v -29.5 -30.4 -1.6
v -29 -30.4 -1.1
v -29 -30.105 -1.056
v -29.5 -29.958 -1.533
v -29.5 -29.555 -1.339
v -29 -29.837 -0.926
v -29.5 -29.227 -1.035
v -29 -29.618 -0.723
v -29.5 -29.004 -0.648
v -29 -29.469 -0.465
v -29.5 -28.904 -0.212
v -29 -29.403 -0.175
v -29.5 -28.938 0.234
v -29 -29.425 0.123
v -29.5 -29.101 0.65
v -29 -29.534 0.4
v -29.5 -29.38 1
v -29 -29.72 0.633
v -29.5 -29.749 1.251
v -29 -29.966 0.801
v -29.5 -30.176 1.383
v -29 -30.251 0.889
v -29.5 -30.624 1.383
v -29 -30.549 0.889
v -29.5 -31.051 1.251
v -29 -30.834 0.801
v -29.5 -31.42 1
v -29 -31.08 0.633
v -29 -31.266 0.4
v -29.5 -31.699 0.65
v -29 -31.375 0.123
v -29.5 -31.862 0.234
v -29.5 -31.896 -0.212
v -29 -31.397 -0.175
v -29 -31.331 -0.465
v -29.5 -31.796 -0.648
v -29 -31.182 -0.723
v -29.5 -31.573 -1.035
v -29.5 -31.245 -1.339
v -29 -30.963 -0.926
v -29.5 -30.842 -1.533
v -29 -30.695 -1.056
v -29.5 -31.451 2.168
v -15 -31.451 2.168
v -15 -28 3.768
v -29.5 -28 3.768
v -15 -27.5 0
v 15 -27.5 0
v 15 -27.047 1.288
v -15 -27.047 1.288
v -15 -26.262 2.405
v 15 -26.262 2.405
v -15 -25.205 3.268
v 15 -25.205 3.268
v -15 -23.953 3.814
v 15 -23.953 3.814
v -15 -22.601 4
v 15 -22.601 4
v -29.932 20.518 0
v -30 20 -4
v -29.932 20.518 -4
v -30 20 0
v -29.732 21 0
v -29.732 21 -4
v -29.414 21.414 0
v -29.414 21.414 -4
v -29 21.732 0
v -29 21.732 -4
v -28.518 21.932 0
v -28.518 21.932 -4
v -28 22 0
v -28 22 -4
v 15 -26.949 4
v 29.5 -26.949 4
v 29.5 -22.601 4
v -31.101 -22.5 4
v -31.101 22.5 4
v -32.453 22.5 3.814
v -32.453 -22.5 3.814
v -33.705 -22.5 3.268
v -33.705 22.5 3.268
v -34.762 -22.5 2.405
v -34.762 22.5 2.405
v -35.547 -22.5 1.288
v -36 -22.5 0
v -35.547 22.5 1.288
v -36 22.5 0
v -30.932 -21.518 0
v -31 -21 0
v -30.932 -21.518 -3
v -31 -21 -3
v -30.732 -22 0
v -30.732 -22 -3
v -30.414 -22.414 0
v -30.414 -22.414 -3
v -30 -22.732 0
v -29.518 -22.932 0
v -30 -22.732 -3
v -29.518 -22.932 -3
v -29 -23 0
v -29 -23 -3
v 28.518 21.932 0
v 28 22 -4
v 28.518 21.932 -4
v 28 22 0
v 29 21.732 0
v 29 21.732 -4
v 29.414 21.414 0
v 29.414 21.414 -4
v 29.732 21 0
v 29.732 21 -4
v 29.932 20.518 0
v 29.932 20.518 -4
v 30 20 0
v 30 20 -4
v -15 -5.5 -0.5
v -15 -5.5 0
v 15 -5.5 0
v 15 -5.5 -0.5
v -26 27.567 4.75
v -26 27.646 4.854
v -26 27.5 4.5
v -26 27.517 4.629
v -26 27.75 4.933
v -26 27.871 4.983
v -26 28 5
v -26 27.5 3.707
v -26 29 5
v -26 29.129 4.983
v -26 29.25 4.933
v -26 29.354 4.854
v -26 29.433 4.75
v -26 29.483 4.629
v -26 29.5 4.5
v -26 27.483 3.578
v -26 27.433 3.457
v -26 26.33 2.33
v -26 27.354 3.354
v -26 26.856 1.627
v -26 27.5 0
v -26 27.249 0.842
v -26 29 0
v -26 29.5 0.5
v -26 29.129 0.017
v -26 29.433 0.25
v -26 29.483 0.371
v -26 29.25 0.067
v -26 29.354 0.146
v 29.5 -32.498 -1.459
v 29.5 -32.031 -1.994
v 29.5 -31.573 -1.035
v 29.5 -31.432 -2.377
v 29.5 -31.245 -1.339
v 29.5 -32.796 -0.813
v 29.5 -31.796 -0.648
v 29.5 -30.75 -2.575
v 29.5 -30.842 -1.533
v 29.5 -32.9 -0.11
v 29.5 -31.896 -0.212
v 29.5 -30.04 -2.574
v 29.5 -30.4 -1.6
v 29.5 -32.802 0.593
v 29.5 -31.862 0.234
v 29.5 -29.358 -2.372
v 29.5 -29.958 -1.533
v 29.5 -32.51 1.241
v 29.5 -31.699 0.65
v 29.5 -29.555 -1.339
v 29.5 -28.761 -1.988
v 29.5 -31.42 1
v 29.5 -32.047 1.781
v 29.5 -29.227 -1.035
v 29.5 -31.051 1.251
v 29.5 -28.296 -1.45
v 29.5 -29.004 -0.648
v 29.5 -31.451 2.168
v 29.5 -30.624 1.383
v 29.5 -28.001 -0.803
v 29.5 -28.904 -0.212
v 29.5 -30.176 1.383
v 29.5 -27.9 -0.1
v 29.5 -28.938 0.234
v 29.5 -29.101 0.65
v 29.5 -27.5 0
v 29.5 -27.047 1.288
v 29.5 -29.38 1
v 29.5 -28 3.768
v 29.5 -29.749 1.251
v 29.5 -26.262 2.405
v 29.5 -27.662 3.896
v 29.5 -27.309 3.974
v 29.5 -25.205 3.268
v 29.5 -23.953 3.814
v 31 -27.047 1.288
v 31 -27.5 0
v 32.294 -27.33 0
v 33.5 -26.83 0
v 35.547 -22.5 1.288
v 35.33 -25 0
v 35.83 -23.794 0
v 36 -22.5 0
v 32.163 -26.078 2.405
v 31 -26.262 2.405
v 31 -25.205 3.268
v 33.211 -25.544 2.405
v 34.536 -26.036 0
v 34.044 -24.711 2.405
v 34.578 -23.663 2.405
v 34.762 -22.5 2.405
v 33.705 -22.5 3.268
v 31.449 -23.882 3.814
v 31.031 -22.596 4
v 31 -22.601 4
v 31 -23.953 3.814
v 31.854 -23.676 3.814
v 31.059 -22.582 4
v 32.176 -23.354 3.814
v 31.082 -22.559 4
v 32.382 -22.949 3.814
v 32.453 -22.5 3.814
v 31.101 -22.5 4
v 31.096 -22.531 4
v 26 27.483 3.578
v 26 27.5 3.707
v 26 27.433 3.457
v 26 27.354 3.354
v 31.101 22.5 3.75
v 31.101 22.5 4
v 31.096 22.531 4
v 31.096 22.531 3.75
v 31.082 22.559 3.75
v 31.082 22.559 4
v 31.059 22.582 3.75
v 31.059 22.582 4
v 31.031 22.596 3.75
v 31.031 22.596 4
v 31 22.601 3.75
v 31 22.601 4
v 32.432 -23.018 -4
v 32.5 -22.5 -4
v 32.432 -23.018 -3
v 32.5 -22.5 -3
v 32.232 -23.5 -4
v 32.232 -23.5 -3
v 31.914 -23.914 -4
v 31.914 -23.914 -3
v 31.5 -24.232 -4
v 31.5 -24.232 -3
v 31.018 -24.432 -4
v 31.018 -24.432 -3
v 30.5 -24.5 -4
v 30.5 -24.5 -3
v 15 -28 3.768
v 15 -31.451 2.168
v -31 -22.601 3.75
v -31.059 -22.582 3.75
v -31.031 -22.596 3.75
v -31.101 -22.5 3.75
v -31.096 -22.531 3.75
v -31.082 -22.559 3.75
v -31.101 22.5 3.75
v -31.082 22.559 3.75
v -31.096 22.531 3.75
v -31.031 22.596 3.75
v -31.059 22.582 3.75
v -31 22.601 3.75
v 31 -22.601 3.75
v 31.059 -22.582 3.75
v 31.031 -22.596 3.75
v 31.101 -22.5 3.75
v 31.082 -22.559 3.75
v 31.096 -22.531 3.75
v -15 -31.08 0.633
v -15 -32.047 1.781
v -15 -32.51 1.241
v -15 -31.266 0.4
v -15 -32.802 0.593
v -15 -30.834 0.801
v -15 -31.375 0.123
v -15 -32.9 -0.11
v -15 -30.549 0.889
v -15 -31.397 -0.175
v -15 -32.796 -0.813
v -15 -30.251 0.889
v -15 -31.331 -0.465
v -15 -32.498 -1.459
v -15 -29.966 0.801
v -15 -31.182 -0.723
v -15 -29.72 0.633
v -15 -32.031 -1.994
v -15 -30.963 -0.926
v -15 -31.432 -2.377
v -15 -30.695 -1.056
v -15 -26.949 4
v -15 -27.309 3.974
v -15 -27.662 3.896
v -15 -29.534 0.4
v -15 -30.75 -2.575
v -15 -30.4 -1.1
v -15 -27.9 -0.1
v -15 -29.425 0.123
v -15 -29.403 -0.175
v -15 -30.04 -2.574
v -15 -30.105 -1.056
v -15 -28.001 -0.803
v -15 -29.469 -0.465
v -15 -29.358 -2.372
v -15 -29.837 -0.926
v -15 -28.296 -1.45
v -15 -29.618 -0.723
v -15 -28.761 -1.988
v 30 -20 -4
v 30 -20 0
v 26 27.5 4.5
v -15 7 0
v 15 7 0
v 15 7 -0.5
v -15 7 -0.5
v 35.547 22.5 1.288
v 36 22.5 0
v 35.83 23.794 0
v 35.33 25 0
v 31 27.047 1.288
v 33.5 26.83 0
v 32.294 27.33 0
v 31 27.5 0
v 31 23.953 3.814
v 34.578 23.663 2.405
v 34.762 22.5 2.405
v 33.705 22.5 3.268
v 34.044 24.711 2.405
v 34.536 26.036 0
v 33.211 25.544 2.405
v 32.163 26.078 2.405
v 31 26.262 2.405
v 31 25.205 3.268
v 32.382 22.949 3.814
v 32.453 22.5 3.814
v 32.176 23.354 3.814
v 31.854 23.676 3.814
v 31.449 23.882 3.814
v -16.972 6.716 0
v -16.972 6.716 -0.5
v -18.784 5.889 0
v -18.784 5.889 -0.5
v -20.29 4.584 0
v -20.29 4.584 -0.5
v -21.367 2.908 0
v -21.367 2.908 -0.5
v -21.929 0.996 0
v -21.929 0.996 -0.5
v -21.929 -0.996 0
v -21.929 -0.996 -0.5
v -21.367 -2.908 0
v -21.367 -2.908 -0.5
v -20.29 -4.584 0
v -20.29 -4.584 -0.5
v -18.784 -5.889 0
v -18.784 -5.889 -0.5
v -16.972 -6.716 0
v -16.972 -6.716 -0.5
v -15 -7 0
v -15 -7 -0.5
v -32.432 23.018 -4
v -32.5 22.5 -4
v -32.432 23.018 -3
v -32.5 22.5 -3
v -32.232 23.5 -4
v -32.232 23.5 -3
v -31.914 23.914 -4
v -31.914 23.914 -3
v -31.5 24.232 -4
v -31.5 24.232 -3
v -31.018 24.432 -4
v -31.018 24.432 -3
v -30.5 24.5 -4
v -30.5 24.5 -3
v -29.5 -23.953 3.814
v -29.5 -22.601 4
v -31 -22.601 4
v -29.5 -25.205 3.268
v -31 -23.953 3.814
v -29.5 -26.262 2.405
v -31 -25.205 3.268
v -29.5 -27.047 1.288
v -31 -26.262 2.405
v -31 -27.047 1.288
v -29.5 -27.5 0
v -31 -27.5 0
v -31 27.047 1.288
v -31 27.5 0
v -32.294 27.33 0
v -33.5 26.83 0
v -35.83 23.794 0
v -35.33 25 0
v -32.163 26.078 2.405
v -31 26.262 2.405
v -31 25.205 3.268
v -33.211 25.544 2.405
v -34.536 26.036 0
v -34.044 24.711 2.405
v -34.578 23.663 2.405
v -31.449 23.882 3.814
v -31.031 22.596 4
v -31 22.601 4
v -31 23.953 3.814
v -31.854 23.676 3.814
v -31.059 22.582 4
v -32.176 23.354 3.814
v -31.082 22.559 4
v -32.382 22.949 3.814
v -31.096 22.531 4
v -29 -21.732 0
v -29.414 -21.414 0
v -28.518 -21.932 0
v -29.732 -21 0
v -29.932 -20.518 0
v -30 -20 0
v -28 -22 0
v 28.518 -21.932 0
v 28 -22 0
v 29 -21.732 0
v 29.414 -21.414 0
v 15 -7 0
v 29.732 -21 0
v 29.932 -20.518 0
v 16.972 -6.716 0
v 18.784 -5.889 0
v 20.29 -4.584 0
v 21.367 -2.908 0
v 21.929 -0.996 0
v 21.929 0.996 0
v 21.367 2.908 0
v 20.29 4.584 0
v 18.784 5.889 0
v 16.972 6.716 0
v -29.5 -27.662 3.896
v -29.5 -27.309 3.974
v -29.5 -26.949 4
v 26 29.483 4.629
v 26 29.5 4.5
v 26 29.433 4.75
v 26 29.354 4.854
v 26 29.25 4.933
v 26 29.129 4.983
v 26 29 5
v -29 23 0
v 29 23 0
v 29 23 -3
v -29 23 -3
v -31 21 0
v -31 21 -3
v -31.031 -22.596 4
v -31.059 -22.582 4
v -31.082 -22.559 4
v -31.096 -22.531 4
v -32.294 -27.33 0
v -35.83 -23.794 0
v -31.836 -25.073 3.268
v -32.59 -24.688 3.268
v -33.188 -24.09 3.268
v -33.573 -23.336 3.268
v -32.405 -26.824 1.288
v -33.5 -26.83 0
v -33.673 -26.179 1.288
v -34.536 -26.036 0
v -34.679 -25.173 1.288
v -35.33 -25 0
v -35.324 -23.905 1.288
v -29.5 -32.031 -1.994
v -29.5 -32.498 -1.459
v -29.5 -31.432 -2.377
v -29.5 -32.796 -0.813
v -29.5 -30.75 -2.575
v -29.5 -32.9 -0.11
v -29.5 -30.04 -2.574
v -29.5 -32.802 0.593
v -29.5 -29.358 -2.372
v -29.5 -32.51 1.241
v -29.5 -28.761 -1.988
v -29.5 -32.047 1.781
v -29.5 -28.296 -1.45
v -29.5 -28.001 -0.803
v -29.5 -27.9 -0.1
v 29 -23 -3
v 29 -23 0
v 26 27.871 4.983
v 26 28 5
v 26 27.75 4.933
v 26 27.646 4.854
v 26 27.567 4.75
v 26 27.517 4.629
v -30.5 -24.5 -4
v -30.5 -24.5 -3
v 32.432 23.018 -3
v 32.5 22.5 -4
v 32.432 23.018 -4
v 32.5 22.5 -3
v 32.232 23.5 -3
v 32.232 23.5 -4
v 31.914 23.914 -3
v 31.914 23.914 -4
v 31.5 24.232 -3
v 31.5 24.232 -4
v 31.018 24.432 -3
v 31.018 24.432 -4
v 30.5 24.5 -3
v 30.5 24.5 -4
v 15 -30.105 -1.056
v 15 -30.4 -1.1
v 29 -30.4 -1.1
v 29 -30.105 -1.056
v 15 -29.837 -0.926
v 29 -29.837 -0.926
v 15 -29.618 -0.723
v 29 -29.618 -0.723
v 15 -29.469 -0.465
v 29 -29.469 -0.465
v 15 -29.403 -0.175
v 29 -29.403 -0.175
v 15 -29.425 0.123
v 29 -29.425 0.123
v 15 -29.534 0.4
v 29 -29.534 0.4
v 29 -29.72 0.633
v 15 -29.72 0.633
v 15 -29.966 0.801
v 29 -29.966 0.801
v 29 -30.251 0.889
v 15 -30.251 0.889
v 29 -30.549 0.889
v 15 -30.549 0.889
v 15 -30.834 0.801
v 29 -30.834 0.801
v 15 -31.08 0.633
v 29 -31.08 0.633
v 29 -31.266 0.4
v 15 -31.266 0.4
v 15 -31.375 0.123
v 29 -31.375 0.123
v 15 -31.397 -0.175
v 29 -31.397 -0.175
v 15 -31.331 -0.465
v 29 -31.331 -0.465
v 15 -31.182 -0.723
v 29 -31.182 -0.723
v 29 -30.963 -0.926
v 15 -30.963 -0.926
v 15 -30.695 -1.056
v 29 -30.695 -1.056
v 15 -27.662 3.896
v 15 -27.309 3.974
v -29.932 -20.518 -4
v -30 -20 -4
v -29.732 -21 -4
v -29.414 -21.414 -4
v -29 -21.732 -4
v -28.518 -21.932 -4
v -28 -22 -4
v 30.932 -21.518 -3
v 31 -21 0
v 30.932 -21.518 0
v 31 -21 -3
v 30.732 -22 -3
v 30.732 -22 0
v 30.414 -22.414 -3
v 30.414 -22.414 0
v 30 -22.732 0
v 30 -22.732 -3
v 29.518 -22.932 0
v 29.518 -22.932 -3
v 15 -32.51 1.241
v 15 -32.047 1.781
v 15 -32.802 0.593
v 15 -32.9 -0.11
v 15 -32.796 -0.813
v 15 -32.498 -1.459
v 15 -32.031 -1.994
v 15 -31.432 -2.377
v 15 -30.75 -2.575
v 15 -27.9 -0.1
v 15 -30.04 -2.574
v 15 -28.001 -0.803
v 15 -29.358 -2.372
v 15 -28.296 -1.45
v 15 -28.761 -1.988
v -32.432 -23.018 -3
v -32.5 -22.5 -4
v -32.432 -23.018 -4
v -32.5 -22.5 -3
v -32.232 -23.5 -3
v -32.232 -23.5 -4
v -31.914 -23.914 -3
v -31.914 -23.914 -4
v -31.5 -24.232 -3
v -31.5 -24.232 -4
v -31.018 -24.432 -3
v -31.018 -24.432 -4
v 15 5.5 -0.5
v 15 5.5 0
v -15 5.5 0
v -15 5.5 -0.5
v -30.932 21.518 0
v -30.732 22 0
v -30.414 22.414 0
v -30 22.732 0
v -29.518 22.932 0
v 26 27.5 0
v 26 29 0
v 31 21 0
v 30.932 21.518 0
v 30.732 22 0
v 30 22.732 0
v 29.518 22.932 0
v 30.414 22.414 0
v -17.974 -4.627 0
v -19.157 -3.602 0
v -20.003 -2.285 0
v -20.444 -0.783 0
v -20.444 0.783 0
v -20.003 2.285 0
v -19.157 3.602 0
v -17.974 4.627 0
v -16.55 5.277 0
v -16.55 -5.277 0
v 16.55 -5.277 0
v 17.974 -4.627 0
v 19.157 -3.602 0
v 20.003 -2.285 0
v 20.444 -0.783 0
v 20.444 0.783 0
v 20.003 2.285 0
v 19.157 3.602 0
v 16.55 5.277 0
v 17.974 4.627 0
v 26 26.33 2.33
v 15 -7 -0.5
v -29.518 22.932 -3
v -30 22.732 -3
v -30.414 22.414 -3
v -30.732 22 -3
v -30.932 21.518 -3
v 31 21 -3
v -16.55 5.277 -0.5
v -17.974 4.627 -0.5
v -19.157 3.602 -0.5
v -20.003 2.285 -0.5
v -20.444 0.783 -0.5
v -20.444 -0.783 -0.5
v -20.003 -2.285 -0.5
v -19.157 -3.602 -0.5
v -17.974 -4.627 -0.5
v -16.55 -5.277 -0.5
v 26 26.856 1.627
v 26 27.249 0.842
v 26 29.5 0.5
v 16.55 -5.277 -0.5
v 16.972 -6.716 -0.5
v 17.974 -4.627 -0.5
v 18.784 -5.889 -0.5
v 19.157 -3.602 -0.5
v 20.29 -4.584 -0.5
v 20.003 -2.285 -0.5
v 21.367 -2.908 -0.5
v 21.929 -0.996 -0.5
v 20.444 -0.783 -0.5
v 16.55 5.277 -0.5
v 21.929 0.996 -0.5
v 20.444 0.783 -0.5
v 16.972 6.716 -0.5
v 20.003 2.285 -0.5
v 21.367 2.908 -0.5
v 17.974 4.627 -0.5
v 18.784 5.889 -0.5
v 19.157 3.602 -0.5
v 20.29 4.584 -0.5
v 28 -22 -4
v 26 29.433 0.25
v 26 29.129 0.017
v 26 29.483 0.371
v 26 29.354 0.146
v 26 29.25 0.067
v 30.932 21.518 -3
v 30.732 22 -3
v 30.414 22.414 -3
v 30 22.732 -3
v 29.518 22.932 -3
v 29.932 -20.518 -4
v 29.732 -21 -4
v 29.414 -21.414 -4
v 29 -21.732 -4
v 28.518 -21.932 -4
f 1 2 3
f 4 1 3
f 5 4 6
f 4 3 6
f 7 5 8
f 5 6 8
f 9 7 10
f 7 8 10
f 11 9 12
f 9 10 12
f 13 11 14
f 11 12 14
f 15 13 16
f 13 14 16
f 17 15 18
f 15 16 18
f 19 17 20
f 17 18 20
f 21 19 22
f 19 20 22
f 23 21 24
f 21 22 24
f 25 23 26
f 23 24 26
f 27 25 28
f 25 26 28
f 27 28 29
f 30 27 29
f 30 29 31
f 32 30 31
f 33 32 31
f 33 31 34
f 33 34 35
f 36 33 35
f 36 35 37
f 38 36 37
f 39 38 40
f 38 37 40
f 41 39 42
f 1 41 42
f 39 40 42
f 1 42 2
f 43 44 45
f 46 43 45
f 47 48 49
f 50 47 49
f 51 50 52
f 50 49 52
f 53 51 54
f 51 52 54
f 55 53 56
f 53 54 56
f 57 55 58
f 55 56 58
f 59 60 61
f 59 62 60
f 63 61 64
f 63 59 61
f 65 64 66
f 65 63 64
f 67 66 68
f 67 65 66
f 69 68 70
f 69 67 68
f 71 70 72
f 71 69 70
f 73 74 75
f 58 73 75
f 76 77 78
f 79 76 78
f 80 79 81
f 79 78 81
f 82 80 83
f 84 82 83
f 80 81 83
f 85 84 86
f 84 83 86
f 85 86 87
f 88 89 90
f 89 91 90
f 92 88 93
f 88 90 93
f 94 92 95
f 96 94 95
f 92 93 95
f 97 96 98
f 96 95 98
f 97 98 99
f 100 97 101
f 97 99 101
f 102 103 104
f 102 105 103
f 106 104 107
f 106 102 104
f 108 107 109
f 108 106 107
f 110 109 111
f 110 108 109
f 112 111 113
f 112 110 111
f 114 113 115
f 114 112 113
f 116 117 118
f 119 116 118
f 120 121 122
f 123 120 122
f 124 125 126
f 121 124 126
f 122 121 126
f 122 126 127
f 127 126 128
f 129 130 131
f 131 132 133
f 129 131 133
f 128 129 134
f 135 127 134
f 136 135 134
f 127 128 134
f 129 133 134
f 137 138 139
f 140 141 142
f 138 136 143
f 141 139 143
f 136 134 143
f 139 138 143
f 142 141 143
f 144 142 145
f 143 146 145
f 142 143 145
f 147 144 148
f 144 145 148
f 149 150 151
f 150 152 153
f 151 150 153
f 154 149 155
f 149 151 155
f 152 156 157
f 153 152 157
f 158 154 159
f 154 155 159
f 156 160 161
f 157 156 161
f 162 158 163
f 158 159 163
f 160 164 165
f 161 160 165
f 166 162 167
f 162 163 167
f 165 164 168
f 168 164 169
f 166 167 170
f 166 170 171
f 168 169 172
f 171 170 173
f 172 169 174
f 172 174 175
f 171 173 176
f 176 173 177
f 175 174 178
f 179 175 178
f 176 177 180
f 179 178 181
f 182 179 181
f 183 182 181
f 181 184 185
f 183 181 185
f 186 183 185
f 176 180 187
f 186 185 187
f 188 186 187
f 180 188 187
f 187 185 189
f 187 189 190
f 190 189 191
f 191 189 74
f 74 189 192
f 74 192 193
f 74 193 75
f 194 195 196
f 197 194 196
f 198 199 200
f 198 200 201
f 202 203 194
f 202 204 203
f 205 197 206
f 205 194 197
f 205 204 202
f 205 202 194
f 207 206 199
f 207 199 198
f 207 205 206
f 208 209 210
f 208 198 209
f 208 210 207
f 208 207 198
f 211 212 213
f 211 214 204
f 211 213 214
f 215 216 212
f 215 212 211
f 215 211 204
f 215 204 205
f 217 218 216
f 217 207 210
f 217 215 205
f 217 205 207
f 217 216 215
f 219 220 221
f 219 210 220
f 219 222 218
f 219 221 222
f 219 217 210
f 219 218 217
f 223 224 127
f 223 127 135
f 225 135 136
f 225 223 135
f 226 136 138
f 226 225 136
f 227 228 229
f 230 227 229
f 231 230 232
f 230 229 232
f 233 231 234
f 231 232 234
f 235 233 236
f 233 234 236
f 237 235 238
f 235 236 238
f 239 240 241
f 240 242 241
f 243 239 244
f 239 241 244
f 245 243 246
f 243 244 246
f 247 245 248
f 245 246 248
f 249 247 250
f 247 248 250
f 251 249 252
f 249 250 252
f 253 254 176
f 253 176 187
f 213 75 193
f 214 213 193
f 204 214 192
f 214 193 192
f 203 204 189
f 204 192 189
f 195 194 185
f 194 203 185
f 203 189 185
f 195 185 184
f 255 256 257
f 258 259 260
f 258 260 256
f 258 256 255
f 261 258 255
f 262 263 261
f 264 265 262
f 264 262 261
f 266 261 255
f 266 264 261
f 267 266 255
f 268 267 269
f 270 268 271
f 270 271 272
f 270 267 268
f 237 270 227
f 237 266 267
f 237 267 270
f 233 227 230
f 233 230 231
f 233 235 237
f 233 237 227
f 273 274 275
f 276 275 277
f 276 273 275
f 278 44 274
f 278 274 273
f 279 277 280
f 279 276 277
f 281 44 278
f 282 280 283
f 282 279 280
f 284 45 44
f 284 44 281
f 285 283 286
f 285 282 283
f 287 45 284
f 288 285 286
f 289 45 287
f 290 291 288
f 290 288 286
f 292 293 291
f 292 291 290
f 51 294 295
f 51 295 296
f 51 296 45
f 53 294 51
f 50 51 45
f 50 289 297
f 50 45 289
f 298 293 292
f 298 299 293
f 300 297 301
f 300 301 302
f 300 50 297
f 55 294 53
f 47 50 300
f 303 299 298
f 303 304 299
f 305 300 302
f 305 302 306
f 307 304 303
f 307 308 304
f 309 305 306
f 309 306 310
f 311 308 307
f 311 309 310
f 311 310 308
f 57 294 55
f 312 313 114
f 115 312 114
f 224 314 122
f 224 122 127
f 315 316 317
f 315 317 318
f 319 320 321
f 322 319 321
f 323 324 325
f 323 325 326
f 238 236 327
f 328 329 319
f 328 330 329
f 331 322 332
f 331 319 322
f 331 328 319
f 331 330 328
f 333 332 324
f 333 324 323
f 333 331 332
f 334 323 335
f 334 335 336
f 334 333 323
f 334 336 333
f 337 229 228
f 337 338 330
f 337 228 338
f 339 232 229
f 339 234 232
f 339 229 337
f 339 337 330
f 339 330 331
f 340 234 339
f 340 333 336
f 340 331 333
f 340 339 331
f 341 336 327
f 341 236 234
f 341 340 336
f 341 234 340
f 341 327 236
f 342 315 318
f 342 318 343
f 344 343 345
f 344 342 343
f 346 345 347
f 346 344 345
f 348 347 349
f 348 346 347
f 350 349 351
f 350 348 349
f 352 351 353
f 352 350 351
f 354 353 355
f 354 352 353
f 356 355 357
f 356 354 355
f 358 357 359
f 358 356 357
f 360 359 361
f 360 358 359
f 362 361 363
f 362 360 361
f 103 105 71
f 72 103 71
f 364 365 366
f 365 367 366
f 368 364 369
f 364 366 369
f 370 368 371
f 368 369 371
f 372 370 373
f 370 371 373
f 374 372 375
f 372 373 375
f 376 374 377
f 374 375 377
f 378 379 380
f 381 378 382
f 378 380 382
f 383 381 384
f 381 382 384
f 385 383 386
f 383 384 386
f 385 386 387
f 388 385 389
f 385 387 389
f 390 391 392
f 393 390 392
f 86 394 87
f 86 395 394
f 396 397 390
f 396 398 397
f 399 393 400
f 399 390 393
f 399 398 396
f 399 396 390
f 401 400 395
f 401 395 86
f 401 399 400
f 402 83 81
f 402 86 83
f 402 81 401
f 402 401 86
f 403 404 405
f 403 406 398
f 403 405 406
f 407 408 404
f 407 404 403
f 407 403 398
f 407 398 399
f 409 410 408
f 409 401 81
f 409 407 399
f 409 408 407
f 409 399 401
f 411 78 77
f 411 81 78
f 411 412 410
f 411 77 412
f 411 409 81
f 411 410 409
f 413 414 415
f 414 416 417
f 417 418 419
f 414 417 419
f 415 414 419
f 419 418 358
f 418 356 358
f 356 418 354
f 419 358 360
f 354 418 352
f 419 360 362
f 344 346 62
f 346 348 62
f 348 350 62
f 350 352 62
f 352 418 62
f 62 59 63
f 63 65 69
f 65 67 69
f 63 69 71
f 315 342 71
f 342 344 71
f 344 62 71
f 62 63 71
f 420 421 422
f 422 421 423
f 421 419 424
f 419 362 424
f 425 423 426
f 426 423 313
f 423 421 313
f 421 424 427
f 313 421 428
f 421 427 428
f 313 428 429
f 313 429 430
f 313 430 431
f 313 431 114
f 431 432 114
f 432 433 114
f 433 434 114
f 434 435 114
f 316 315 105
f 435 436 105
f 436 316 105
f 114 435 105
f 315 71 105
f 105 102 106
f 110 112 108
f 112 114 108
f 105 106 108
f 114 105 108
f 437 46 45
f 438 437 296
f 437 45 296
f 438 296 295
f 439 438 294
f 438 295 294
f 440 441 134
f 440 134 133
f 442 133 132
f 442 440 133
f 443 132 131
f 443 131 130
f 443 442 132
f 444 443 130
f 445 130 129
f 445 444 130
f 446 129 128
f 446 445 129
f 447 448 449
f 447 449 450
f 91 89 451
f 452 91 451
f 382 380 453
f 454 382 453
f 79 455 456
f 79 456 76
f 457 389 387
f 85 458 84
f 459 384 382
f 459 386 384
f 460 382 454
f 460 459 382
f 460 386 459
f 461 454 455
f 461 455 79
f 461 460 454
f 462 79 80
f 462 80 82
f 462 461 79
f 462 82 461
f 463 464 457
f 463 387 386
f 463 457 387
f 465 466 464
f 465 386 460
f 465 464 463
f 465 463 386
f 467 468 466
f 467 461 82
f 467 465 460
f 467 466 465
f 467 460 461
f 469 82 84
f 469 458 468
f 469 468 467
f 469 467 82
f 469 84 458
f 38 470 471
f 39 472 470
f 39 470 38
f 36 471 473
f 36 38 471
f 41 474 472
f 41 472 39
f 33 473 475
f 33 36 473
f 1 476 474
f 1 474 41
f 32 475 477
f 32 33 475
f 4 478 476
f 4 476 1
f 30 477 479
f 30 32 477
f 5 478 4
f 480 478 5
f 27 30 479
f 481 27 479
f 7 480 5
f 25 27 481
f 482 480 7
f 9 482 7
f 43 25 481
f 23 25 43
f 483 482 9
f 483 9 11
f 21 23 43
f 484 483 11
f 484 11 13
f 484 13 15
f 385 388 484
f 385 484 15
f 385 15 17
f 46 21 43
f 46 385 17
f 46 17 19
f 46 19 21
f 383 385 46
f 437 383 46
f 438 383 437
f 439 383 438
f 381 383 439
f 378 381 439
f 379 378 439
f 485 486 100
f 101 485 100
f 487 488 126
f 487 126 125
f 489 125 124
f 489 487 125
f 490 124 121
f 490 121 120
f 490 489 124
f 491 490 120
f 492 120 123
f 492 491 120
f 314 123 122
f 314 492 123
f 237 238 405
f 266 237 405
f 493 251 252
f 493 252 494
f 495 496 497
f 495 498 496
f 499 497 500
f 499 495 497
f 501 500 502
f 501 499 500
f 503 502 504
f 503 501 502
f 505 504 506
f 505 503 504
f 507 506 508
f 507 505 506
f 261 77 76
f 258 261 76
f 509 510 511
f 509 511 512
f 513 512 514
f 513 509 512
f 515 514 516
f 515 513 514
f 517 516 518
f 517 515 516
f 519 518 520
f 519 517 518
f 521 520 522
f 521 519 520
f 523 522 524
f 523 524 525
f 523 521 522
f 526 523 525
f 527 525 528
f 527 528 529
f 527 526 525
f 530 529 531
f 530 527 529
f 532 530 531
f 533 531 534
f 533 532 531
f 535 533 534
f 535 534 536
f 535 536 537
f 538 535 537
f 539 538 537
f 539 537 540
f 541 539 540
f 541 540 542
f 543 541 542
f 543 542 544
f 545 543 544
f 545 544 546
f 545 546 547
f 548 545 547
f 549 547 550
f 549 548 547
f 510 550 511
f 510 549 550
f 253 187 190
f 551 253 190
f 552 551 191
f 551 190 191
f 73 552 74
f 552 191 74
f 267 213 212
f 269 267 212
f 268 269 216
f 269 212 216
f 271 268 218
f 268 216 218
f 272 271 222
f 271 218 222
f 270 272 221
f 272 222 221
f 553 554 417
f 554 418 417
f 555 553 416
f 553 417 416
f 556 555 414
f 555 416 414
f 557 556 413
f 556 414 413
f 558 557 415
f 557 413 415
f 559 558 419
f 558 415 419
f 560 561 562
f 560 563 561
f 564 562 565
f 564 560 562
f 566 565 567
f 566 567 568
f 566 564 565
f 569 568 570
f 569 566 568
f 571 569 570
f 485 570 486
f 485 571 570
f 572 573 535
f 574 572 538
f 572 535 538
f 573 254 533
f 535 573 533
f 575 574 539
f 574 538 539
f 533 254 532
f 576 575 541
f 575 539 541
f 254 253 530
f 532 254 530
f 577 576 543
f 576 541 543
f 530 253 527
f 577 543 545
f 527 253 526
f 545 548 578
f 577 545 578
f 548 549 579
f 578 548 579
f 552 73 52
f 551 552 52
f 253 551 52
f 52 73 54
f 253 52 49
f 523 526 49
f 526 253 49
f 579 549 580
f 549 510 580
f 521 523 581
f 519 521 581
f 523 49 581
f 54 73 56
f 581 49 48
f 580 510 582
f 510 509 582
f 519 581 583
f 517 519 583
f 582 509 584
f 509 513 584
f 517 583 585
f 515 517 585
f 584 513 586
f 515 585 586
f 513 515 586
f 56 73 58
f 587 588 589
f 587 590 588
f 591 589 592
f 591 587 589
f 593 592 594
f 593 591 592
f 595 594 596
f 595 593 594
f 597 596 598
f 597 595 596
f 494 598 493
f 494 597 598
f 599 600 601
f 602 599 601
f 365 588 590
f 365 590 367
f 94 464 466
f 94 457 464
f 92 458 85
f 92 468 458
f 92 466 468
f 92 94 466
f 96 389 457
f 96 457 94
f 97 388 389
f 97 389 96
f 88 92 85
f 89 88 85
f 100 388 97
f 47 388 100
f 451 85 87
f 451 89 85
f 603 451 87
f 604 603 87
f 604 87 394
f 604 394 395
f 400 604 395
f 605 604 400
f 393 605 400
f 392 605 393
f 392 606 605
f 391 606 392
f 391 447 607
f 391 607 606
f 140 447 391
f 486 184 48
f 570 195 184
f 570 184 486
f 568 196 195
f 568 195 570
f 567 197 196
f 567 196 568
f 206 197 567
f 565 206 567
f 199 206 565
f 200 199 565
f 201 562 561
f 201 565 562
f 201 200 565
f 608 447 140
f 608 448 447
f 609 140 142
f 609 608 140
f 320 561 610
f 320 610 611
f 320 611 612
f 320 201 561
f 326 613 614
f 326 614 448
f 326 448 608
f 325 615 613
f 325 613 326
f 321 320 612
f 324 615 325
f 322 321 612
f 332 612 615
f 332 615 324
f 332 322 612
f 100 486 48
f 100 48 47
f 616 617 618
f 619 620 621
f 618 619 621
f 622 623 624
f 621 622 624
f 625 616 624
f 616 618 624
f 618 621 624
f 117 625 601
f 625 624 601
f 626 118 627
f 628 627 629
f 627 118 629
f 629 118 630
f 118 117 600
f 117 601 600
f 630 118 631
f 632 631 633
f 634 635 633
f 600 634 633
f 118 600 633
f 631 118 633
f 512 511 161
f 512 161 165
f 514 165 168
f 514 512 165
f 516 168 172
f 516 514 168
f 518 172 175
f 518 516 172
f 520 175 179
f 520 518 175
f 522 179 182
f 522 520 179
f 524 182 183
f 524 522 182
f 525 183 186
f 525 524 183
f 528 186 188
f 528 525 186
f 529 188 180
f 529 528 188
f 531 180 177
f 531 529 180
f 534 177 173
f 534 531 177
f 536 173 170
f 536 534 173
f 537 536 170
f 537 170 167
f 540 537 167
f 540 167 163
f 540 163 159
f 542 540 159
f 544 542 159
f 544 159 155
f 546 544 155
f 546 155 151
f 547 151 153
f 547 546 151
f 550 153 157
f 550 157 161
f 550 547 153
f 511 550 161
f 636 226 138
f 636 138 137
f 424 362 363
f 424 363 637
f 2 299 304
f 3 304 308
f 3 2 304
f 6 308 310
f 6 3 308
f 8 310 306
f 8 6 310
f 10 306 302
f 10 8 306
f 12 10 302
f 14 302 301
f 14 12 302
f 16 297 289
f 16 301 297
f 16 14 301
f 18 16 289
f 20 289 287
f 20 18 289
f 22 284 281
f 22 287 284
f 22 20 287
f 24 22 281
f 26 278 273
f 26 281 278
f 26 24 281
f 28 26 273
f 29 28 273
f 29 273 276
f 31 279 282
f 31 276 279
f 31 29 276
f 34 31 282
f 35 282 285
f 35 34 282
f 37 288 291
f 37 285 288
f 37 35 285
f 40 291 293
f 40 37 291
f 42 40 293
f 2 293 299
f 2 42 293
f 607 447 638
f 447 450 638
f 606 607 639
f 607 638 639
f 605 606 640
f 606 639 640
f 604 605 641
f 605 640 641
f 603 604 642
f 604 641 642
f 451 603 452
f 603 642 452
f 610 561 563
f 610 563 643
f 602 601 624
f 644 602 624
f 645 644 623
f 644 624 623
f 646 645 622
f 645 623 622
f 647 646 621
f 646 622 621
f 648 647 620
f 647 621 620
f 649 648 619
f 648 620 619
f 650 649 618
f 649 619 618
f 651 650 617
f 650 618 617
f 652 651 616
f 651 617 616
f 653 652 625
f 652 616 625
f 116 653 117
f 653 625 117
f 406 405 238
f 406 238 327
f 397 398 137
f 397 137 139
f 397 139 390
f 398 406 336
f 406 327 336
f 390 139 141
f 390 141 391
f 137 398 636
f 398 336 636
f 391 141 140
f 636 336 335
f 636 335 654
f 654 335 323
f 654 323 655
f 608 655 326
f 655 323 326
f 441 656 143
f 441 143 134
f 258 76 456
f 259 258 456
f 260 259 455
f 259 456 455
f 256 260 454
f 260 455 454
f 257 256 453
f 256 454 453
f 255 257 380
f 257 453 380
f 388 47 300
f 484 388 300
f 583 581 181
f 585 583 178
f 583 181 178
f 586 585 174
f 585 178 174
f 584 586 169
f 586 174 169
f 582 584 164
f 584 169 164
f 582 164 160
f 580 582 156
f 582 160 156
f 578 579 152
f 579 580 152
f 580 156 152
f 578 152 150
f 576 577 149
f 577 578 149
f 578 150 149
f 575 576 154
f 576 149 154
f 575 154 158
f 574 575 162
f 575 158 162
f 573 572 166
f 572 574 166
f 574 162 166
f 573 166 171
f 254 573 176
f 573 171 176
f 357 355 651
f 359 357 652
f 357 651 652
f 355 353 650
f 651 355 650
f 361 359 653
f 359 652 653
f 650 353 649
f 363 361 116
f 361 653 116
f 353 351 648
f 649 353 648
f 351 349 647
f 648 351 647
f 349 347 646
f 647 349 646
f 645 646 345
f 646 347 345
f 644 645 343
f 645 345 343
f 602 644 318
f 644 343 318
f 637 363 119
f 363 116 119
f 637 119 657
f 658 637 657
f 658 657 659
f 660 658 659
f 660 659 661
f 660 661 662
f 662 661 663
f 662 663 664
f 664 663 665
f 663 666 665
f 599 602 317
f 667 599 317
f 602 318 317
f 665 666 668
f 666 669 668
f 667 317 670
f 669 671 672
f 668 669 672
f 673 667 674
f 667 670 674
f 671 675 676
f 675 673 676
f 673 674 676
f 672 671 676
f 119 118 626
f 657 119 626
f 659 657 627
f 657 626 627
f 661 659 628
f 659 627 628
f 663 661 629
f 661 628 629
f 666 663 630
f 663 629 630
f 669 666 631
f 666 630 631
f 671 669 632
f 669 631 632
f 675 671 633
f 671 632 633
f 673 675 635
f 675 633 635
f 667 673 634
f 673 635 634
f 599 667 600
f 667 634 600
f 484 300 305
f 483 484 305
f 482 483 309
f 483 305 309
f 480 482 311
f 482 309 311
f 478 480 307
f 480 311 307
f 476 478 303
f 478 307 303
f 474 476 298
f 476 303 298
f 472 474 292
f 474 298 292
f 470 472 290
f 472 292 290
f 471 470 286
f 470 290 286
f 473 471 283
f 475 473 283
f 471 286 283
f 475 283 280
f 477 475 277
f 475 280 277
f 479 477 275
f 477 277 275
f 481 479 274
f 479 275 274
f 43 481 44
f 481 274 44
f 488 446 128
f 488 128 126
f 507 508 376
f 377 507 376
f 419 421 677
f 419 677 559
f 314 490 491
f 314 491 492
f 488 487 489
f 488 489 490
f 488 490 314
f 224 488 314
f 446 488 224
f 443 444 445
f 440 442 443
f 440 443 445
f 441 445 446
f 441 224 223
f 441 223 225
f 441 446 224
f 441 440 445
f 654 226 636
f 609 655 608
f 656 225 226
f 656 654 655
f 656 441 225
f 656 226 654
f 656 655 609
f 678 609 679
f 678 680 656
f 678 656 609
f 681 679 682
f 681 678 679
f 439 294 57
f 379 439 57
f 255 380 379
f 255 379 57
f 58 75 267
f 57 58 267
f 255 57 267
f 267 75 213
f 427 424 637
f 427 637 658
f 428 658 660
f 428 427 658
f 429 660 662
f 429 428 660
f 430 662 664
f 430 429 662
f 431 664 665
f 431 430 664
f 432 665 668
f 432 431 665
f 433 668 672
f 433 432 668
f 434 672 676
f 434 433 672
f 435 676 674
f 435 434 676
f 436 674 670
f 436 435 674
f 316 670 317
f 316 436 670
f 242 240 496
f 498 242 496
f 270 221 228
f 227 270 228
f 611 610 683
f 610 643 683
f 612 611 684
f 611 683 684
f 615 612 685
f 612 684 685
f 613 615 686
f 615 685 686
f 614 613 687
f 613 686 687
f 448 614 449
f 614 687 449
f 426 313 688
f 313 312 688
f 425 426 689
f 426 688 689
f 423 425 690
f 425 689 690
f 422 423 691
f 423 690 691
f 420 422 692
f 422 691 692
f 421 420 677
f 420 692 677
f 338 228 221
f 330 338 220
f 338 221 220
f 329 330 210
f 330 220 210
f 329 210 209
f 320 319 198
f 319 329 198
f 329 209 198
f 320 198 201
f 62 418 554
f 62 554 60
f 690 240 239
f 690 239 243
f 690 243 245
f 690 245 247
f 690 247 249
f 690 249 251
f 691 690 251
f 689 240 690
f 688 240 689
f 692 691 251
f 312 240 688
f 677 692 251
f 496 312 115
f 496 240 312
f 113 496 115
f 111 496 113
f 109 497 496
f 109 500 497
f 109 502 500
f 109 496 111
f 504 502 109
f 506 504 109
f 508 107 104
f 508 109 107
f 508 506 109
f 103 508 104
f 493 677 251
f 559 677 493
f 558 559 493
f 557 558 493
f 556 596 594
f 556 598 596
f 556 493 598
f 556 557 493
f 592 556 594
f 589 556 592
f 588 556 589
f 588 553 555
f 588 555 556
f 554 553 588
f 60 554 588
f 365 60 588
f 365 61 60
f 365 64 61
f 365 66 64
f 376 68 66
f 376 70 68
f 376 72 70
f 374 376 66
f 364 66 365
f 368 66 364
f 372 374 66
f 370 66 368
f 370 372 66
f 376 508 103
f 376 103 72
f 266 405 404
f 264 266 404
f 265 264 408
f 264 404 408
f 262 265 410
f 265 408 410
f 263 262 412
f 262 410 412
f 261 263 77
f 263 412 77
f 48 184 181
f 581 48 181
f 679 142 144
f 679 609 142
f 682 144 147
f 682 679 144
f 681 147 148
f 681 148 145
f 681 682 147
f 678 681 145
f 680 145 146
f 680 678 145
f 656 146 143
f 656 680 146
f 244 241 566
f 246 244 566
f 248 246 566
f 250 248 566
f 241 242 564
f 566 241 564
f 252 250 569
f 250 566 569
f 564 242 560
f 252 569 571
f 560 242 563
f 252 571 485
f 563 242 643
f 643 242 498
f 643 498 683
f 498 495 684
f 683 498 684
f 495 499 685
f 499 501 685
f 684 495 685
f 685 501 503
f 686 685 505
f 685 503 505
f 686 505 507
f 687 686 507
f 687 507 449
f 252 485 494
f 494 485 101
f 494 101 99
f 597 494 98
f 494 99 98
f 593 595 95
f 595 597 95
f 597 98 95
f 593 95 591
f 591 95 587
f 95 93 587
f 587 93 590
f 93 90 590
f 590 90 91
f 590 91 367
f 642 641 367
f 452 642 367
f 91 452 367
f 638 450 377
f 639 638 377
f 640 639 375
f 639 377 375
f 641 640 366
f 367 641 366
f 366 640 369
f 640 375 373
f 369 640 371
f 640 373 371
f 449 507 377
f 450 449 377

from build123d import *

# Parameters (mm, degrees)
SKETCH1_W           = 72
SKETCH1_H           = 55
BOSS_EXTRUDE1_DEPTH = 4
FILLET3_R           = 5
FILLET4_R           = 5
CUT_EXTRUDE1_DEPTH  = 0.25
SKETCH3_W           = 62
SKETCH3_H           = 46
SKETCH3_W_2         = 60
SKETCH3_H_2         = 44
BOSS_EXTRUDE2_DEPTH = 4
SKETCH4_W           = 65
SKETCH4_H           = 49
SKETCH4_W_2         = 60
SKETCH4_H_2         = 44
BOSS_EXTRUDE3_DEPTH = 1
FILLET2_R           = 2
BOSS_EXTRUDE4_DEPTH = 0.5
BOSS_EXTRUDE5_DEPTH = 26
SKETCH7_R           = 1
BOSS_EXTRUDE6_DEPTH = 29.5
CUT_EXTRUDE2_DEPTH  = 15
CHAMFER1_SIZE       = 0.5


with BuildPart() as part:
    # Sketch1 → Boss-Extrude1 (new body)
    with BuildSketch(Plane.XY):
        Rectangle(SKETCH1_W, SKETCH1_H)
    extrude(amount=BOSS_EXTRUDE1_DEPTH)

    # Fillet3
    fillet3_edges = [part.edges().sort_by_distance(p)[0] for p in [
        (36, -27.5, 2),
        (-36, -27.5, 2),
        (-36, 27.5, 2),
        (36, 27.5, 2),
    ]]
    fillet(fillet3_edges, radius=FILLET3_R)

    # Fillet4
    # the kernel refuses this fillet: 5 mm, written as the material it takes off along each edge
    with BuildSketch(Plane(origin=(31, 22.5, 4), x_dir=(1, 0, 0), z_dir=(0, -1, 0))) as fillet4_piece_1:
        with BuildLine():
            CenterArc((0.101020514, -5), FILLET4_R, 11.536959033, 78.463040967)
            Line((5, -4), (5.09797959, -3.98))
            ThreePointArc((5.09797959, -3.98), (5.1, -2), (5.1, 0))
            Line((5.1, 0), (5, 0.1))
            Line((5, 0.1), (0.101020514, 0.1))
            Line((0.101020514, 0.1), (0.101020514, 0))
        make_face()
    revolve(axis=Axis((31, 22.5, 4), (0, 0, 1)), revolution_arc=90, mode=Mode.SUBTRACT)
    with BuildSketch(Plane(origin=(36, -22.5, 4), x_dir=(-1, 0, 0), z_dir=(0, 1, 0)), Plane(origin=(-36, 22.5, 4), x_dir=(1, 0, 0), z_dir=(0, -1, 0))) as fillet4_piece_2:
        with BuildLine():
            CenterArc((4.898979486, -5), FILLET4_R, 90, 78.463040967)
            Line((0, -4), (-0.09797959, -3.98))
            ThreePointArc((-0.09797959, -3.98), (-0.1, -2), (-0.1, 0))
            Line((-0.1, 0), (0, 0.1))
            Line((0, 0.1), (4.898979486, 0.1))
            Line((4.898979486, 0.1), (4.898979486, 0))
        make_face()
    extrude(amount=45, mode=Mode.SUBTRACT)
    with BuildSketch(Plane(origin=(31, -22.5, 4), x_dir=(0, -1, 0), z_dir=(-1, 0, 0))) as fillet4_piece_3:
        with BuildLine():
            CenterArc((0.101020514, -5), FILLET4_R, 11.536959033, 78.463040967)
            Line((0.101020514, 0), (0.101020514, 0.1))
            Line((0.101020514, 0.1), (5, 0.1))
            Line((5, 0.1), (5.1, 0))
            ThreePointArc((5.1, 0), (5.1, -2), (5.09797959, -3.98))
            Line((5.09797959, -3.98), (5, -4))
        make_face()
    revolve(axis=Axis((31, -22.5, 4), (0, 0, 1)), revolution_arc=90, mode=Mode.SUBTRACT)
    with BuildSketch(Plane(origin=(-31, -27.5, 4), x_dir=(0, 1.564970375511121e-12, -1.0), z_dir=(1, 0, 0))) as fillet4_piece_4:
        with BuildLine():
            CenterArc((5, 4.898979486), FILLET4_R, 180, 78.463040967)
            Line((0, 4.898979486), (-0.1, 4.898979486))
            Line((-0.1, 4.898979486), (-0.1, 0))
            Line((-0.1, 0), (0, -0.1))
            ThreePointArc((0, -0.1), (2, -0.1), (3.98, -0.09797959))
            Line((3.98, -0.09797959), (4, 0))
        make_face()
    extrude(amount=62, mode=Mode.SUBTRACT)
    with BuildSketch(Plane(origin=(-31, -22.5, 4), x_dir=(0, -1, 0), z_dir=(1, 0, 0))) as fillet4_piece_5:
        with BuildLine():
            CenterArc((0.101020514, 5), FILLET4_R, 270, 78.463040967)
            Line((0.101020514, 0), (0.101020514, -0.1))
            Line((0.101020514, -0.1), (5, -0.1))
            Line((5, -0.1), (5.1, 0))
            ThreePointArc((5.1, 0), (5.1, 2), (5.09797959, 3.98))
            Line((5.09797959, 3.98), (5, 4))
        make_face()
    revolve(axis=Axis((-31, -22.5, 4), (0, 0, -1)), revolution_arc=90, mode=Mode.SUBTRACT)
    with BuildSketch(Plane(origin=(-31, 22.5, 4), x_dir=(0, 1, 0), z_dir=(1, 0, 0))) as fillet4_piece_6:
        with BuildLine():
            CenterArc((0.101020514, -5), FILLET4_R, 11.536959033, 78.463040967)
            Line((5, -4), (5.09797959, -3.98))
            ThreePointArc((5.09797959, -3.98), (5.1, -2), (5.1, 0))
            Line((5.1, 0), (5, 0.1))
            Line((5, 0.1), (0.101020514, 0.1))
            Line((0.101020514, 0.1), (0.101020514, 0))
        make_face()
    revolve(axis=Axis((-31, 22.5, 4), (0, 0, 1)), revolution_arc=90, mode=Mode.SUBTRACT)
    with BuildSketch(Plane(origin=(31, 27.5, 4), x_dir=(0, -1, 0), z_dir=(-1, 0, 0))) as fillet4_piece_7:
        with BuildLine():
            CenterArc((4.898979486, -5), FILLET4_R, 90, 78.463040967)
            Line((0, -4), (-0.09797959, -3.98))
            ThreePointArc((-0.09797959, -3.98), (-0.1, -2), (-0.1, 0))
            Line((-0.1, 0), (0, 0.1))
            Line((0, 0.1), (4.898979486, 0.1))
            Line((4.898979486, 0.1), (4.898979486, 0))
        make_face()
    extrude(amount=62, mode=Mode.SUBTRACT)

    # Sketch2 → Cut-Extrude1 (cut)
    with BuildSketch(Plane.XY.offset(4)):
        with BuildLine():
            Line((31.101020514, -22.5), (31.101020514, 22.5))
            ThreePointArc((31.101020514, 22.5), (31.071432291, 22.571432291), (31, 22.601020514))
            Line((31, 22.601020514), (-31, 22.601020514))
            ThreePointArc((-31, 22.601020514), (-31.071432291, 22.571432291), (-31.101020514, 22.5))
            Line((-31.101020514, 22.5), (-31.101020514, -22.5))
            ThreePointArc((-31.101020514, -22.5), (-31.071432291, -22.571432291), (-31, -22.601020514))
            Line((-31, -22.601020514), (31, -22.601020514))
            ThreePointArc((31, -22.601020514), (31.071432291, -22.571432291), (31.101020514, -22.5))
        make_face()
    extrude(amount=-CUT_EXTRUDE1_DEPTH, mode=Mode.SUBTRACT)

    # Sketch3 → Boss-Extrude2 (add)
    with BuildSketch(Plane(origin=(0, 0, 0), x_dir=(-1, 0, 0), z_dir=(0, 0, -1))):
        Rectangle(SKETCH3_W, SKETCH3_H)
        Rectangle(SKETCH3_W_2, SKETCH3_H_2, mode=Mode.SUBTRACT)
    extrude(amount=BOSS_EXTRUDE2_DEPTH)

    # Sketch4 → Boss-Extrude3 (add)
    with BuildSketch(Plane(origin=(0, 0, -4), x_dir=(-1, 0, 0), z_dir=(0, 0, -1))):
        Rectangle(SKETCH4_W, SKETCH4_H)
        Rectangle(SKETCH4_W_2, SKETCH4_H_2, mode=Mode.SUBTRACT)
    extrude(amount=-BOSS_EXTRUDE3_DEPTH)

    # Fillet2
    fillet2_edges = [part.edges().sort_by_distance(p)[0] for p in [
        (31, 23, -1.5),
        (-31, 23, -1.5),
        (-31, -23, -1.5),
        (31, -23, -1.5),
        (32.5, 24.5, -3.5),
        (-32.5, 24.5, -3.5),
        (-32.5, -24.5, -3.5),
        (32.5, -24.5, -3.5),
        (-30, 22, -2),
        (30, 22, -2),
        (30, -22, -2),
        (-30, -22, -2),
    ]]
    fillet(fillet2_edges, radius=FILLET2_R)

    # Sketch5 → Boss-Extrude4 (add)
    with BuildSketch(Plane(origin=(0, 0, 0), x_dir=(-1, 0, 0), z_dir=(0, 0, -1))):
        with BuildLine():
            Line((-15, 7), (15, 7))
            ThreePointArc((15, 7), (22, 0), (15, -7))
            Line((15, -7), (-15, -7))
            ThreePointArc((-15, -7), (-22, 0), (-15, 7))
        make_face()
        with BuildLine():
            Line((-15, 5.5), (15, 5.5))
            ThreePointArc((15, 5.5), (20.5, 0), (15, -5.5))
            Line((15, -5.5), (-15, -5.5))
            ThreePointArc((-15, -5.5), (-20.5, 0), (-15, 5.5))
        make_face(mode=Mode.SUBTRACT)
    extrude(amount=BOSS_EXTRUDE4_DEPTH)

    # Sketch6 → Boss-Extrude5 (add, symmetric)
    with BuildSketch(Plane(origin=(0, 0, 0), x_dir=(0, 0, -1), z_dir=(1, 0, 0))):
        with BuildLine():
            Line((0, 27.5), (0, 29))
            ThreePointArc((0, 29), (-0.146446609, 29.353553391), (-0.5, 29.5))
            Line((-0.5, 29.5), (-4.5, 29.5))
            ThreePointArc((-4.5, 29.5), (-4.853553391, 29.353553391), (-5, 29))
            Line((-5, 29), (-5, 28))
            ThreePointArc((-5, 28), (-4.853553391, 27.646446609), (-4.5, 27.5))
            Line((-4.5, 27.5), (-3.707106781, 27.5))
            ThreePointArc((-3.707106781, 27.5), (-3.515765065, 27.461939766), (-3.353553391, 27.353553391))
            Line((-3.353553391, 27.353553391), (-1.948480403, 25.948480403))
            Line((-1.948480403, 25.948480403), (0, 25.948480403))
            Line((0, 25.948480403), (0, 27.5))
        make_face()
    extrude(amount=BOSS_EXTRUDE5_DEPTH, both=True)

    # Sketch7 → Boss-Extrude6 (add, symmetric)
    with BuildSketch(Plane(origin=(0, 0, 0), x_dir=(0, 0, -1), z_dir=(1, 0, 0))):
        with BuildLine():
            Line((-2.16812286, -31.451484043), (-3.76812286, -28.00017482))
            ThreePointArc((-3.76812286, -28.00017482), (-3.941342576, -27.487064649), (-4, -26.948690777))
            Line((-4, -26.948690777), (-4, -22.601020514))
            ThreePointArc((-4, -22.601020514), (-2.872983346, -25.763298175), (0, -27.5))
            Line((0, -27.5), (0.1, -27.9))
            ThreePointArc((0.1, -27.9), (2.206977706, -31.745602076), (-2.16812286, -31.451484043))
        make_face()
        with Locations((0.1, -30.4)):
            Circle(SKETCH7_R, mode=Mode.SUBTRACT)
    extrude(amount=BOSS_EXTRUDE6_DEPTH, both=True)

    # Sketch8 → Cut-Extrude2 (cut, symmetric)
    with BuildSketch(Plane(origin=(0, 0, 0), x_dir=(0, 0, -1), z_dir=(1, 0, 0))):
        with BuildLine():
            Line((0.1, -27.9), (0, -27.5))
            ThreePointArc((0, -27.5), (-2.872983346, -25.763298175), (-4, -22.601020514))
            Line((-4, -22.601020514), (-4, -26.948690777))
            ThreePointArc((-4, -26.948690777), (-3.941342576, -27.487064649), (-3.76812286, -28.00017482))
            Line((-3.76812286, -28.00017482), (-2.16812286, -31.451484043))
            ThreePointArc((-2.16812286, -31.451484043), (2.206977706, -31.745602076), (0.1, -27.9))
        make_face()
    extrude(amount=CUT_EXTRUDE2_DEPTH, both=True, mode=Mode.SUBTRACT)

    # Chamfer1
    chamfer1_edges = [part.edges().sort_by_distance(p)[0] for p in [
        (-29.5, -30.4, 0.9),
        (29.5, -30.4, 0.9),
    ]]
    chamfer(chamfer1_edges, length=CHAMFER1_SIZE)


solid = part.part
